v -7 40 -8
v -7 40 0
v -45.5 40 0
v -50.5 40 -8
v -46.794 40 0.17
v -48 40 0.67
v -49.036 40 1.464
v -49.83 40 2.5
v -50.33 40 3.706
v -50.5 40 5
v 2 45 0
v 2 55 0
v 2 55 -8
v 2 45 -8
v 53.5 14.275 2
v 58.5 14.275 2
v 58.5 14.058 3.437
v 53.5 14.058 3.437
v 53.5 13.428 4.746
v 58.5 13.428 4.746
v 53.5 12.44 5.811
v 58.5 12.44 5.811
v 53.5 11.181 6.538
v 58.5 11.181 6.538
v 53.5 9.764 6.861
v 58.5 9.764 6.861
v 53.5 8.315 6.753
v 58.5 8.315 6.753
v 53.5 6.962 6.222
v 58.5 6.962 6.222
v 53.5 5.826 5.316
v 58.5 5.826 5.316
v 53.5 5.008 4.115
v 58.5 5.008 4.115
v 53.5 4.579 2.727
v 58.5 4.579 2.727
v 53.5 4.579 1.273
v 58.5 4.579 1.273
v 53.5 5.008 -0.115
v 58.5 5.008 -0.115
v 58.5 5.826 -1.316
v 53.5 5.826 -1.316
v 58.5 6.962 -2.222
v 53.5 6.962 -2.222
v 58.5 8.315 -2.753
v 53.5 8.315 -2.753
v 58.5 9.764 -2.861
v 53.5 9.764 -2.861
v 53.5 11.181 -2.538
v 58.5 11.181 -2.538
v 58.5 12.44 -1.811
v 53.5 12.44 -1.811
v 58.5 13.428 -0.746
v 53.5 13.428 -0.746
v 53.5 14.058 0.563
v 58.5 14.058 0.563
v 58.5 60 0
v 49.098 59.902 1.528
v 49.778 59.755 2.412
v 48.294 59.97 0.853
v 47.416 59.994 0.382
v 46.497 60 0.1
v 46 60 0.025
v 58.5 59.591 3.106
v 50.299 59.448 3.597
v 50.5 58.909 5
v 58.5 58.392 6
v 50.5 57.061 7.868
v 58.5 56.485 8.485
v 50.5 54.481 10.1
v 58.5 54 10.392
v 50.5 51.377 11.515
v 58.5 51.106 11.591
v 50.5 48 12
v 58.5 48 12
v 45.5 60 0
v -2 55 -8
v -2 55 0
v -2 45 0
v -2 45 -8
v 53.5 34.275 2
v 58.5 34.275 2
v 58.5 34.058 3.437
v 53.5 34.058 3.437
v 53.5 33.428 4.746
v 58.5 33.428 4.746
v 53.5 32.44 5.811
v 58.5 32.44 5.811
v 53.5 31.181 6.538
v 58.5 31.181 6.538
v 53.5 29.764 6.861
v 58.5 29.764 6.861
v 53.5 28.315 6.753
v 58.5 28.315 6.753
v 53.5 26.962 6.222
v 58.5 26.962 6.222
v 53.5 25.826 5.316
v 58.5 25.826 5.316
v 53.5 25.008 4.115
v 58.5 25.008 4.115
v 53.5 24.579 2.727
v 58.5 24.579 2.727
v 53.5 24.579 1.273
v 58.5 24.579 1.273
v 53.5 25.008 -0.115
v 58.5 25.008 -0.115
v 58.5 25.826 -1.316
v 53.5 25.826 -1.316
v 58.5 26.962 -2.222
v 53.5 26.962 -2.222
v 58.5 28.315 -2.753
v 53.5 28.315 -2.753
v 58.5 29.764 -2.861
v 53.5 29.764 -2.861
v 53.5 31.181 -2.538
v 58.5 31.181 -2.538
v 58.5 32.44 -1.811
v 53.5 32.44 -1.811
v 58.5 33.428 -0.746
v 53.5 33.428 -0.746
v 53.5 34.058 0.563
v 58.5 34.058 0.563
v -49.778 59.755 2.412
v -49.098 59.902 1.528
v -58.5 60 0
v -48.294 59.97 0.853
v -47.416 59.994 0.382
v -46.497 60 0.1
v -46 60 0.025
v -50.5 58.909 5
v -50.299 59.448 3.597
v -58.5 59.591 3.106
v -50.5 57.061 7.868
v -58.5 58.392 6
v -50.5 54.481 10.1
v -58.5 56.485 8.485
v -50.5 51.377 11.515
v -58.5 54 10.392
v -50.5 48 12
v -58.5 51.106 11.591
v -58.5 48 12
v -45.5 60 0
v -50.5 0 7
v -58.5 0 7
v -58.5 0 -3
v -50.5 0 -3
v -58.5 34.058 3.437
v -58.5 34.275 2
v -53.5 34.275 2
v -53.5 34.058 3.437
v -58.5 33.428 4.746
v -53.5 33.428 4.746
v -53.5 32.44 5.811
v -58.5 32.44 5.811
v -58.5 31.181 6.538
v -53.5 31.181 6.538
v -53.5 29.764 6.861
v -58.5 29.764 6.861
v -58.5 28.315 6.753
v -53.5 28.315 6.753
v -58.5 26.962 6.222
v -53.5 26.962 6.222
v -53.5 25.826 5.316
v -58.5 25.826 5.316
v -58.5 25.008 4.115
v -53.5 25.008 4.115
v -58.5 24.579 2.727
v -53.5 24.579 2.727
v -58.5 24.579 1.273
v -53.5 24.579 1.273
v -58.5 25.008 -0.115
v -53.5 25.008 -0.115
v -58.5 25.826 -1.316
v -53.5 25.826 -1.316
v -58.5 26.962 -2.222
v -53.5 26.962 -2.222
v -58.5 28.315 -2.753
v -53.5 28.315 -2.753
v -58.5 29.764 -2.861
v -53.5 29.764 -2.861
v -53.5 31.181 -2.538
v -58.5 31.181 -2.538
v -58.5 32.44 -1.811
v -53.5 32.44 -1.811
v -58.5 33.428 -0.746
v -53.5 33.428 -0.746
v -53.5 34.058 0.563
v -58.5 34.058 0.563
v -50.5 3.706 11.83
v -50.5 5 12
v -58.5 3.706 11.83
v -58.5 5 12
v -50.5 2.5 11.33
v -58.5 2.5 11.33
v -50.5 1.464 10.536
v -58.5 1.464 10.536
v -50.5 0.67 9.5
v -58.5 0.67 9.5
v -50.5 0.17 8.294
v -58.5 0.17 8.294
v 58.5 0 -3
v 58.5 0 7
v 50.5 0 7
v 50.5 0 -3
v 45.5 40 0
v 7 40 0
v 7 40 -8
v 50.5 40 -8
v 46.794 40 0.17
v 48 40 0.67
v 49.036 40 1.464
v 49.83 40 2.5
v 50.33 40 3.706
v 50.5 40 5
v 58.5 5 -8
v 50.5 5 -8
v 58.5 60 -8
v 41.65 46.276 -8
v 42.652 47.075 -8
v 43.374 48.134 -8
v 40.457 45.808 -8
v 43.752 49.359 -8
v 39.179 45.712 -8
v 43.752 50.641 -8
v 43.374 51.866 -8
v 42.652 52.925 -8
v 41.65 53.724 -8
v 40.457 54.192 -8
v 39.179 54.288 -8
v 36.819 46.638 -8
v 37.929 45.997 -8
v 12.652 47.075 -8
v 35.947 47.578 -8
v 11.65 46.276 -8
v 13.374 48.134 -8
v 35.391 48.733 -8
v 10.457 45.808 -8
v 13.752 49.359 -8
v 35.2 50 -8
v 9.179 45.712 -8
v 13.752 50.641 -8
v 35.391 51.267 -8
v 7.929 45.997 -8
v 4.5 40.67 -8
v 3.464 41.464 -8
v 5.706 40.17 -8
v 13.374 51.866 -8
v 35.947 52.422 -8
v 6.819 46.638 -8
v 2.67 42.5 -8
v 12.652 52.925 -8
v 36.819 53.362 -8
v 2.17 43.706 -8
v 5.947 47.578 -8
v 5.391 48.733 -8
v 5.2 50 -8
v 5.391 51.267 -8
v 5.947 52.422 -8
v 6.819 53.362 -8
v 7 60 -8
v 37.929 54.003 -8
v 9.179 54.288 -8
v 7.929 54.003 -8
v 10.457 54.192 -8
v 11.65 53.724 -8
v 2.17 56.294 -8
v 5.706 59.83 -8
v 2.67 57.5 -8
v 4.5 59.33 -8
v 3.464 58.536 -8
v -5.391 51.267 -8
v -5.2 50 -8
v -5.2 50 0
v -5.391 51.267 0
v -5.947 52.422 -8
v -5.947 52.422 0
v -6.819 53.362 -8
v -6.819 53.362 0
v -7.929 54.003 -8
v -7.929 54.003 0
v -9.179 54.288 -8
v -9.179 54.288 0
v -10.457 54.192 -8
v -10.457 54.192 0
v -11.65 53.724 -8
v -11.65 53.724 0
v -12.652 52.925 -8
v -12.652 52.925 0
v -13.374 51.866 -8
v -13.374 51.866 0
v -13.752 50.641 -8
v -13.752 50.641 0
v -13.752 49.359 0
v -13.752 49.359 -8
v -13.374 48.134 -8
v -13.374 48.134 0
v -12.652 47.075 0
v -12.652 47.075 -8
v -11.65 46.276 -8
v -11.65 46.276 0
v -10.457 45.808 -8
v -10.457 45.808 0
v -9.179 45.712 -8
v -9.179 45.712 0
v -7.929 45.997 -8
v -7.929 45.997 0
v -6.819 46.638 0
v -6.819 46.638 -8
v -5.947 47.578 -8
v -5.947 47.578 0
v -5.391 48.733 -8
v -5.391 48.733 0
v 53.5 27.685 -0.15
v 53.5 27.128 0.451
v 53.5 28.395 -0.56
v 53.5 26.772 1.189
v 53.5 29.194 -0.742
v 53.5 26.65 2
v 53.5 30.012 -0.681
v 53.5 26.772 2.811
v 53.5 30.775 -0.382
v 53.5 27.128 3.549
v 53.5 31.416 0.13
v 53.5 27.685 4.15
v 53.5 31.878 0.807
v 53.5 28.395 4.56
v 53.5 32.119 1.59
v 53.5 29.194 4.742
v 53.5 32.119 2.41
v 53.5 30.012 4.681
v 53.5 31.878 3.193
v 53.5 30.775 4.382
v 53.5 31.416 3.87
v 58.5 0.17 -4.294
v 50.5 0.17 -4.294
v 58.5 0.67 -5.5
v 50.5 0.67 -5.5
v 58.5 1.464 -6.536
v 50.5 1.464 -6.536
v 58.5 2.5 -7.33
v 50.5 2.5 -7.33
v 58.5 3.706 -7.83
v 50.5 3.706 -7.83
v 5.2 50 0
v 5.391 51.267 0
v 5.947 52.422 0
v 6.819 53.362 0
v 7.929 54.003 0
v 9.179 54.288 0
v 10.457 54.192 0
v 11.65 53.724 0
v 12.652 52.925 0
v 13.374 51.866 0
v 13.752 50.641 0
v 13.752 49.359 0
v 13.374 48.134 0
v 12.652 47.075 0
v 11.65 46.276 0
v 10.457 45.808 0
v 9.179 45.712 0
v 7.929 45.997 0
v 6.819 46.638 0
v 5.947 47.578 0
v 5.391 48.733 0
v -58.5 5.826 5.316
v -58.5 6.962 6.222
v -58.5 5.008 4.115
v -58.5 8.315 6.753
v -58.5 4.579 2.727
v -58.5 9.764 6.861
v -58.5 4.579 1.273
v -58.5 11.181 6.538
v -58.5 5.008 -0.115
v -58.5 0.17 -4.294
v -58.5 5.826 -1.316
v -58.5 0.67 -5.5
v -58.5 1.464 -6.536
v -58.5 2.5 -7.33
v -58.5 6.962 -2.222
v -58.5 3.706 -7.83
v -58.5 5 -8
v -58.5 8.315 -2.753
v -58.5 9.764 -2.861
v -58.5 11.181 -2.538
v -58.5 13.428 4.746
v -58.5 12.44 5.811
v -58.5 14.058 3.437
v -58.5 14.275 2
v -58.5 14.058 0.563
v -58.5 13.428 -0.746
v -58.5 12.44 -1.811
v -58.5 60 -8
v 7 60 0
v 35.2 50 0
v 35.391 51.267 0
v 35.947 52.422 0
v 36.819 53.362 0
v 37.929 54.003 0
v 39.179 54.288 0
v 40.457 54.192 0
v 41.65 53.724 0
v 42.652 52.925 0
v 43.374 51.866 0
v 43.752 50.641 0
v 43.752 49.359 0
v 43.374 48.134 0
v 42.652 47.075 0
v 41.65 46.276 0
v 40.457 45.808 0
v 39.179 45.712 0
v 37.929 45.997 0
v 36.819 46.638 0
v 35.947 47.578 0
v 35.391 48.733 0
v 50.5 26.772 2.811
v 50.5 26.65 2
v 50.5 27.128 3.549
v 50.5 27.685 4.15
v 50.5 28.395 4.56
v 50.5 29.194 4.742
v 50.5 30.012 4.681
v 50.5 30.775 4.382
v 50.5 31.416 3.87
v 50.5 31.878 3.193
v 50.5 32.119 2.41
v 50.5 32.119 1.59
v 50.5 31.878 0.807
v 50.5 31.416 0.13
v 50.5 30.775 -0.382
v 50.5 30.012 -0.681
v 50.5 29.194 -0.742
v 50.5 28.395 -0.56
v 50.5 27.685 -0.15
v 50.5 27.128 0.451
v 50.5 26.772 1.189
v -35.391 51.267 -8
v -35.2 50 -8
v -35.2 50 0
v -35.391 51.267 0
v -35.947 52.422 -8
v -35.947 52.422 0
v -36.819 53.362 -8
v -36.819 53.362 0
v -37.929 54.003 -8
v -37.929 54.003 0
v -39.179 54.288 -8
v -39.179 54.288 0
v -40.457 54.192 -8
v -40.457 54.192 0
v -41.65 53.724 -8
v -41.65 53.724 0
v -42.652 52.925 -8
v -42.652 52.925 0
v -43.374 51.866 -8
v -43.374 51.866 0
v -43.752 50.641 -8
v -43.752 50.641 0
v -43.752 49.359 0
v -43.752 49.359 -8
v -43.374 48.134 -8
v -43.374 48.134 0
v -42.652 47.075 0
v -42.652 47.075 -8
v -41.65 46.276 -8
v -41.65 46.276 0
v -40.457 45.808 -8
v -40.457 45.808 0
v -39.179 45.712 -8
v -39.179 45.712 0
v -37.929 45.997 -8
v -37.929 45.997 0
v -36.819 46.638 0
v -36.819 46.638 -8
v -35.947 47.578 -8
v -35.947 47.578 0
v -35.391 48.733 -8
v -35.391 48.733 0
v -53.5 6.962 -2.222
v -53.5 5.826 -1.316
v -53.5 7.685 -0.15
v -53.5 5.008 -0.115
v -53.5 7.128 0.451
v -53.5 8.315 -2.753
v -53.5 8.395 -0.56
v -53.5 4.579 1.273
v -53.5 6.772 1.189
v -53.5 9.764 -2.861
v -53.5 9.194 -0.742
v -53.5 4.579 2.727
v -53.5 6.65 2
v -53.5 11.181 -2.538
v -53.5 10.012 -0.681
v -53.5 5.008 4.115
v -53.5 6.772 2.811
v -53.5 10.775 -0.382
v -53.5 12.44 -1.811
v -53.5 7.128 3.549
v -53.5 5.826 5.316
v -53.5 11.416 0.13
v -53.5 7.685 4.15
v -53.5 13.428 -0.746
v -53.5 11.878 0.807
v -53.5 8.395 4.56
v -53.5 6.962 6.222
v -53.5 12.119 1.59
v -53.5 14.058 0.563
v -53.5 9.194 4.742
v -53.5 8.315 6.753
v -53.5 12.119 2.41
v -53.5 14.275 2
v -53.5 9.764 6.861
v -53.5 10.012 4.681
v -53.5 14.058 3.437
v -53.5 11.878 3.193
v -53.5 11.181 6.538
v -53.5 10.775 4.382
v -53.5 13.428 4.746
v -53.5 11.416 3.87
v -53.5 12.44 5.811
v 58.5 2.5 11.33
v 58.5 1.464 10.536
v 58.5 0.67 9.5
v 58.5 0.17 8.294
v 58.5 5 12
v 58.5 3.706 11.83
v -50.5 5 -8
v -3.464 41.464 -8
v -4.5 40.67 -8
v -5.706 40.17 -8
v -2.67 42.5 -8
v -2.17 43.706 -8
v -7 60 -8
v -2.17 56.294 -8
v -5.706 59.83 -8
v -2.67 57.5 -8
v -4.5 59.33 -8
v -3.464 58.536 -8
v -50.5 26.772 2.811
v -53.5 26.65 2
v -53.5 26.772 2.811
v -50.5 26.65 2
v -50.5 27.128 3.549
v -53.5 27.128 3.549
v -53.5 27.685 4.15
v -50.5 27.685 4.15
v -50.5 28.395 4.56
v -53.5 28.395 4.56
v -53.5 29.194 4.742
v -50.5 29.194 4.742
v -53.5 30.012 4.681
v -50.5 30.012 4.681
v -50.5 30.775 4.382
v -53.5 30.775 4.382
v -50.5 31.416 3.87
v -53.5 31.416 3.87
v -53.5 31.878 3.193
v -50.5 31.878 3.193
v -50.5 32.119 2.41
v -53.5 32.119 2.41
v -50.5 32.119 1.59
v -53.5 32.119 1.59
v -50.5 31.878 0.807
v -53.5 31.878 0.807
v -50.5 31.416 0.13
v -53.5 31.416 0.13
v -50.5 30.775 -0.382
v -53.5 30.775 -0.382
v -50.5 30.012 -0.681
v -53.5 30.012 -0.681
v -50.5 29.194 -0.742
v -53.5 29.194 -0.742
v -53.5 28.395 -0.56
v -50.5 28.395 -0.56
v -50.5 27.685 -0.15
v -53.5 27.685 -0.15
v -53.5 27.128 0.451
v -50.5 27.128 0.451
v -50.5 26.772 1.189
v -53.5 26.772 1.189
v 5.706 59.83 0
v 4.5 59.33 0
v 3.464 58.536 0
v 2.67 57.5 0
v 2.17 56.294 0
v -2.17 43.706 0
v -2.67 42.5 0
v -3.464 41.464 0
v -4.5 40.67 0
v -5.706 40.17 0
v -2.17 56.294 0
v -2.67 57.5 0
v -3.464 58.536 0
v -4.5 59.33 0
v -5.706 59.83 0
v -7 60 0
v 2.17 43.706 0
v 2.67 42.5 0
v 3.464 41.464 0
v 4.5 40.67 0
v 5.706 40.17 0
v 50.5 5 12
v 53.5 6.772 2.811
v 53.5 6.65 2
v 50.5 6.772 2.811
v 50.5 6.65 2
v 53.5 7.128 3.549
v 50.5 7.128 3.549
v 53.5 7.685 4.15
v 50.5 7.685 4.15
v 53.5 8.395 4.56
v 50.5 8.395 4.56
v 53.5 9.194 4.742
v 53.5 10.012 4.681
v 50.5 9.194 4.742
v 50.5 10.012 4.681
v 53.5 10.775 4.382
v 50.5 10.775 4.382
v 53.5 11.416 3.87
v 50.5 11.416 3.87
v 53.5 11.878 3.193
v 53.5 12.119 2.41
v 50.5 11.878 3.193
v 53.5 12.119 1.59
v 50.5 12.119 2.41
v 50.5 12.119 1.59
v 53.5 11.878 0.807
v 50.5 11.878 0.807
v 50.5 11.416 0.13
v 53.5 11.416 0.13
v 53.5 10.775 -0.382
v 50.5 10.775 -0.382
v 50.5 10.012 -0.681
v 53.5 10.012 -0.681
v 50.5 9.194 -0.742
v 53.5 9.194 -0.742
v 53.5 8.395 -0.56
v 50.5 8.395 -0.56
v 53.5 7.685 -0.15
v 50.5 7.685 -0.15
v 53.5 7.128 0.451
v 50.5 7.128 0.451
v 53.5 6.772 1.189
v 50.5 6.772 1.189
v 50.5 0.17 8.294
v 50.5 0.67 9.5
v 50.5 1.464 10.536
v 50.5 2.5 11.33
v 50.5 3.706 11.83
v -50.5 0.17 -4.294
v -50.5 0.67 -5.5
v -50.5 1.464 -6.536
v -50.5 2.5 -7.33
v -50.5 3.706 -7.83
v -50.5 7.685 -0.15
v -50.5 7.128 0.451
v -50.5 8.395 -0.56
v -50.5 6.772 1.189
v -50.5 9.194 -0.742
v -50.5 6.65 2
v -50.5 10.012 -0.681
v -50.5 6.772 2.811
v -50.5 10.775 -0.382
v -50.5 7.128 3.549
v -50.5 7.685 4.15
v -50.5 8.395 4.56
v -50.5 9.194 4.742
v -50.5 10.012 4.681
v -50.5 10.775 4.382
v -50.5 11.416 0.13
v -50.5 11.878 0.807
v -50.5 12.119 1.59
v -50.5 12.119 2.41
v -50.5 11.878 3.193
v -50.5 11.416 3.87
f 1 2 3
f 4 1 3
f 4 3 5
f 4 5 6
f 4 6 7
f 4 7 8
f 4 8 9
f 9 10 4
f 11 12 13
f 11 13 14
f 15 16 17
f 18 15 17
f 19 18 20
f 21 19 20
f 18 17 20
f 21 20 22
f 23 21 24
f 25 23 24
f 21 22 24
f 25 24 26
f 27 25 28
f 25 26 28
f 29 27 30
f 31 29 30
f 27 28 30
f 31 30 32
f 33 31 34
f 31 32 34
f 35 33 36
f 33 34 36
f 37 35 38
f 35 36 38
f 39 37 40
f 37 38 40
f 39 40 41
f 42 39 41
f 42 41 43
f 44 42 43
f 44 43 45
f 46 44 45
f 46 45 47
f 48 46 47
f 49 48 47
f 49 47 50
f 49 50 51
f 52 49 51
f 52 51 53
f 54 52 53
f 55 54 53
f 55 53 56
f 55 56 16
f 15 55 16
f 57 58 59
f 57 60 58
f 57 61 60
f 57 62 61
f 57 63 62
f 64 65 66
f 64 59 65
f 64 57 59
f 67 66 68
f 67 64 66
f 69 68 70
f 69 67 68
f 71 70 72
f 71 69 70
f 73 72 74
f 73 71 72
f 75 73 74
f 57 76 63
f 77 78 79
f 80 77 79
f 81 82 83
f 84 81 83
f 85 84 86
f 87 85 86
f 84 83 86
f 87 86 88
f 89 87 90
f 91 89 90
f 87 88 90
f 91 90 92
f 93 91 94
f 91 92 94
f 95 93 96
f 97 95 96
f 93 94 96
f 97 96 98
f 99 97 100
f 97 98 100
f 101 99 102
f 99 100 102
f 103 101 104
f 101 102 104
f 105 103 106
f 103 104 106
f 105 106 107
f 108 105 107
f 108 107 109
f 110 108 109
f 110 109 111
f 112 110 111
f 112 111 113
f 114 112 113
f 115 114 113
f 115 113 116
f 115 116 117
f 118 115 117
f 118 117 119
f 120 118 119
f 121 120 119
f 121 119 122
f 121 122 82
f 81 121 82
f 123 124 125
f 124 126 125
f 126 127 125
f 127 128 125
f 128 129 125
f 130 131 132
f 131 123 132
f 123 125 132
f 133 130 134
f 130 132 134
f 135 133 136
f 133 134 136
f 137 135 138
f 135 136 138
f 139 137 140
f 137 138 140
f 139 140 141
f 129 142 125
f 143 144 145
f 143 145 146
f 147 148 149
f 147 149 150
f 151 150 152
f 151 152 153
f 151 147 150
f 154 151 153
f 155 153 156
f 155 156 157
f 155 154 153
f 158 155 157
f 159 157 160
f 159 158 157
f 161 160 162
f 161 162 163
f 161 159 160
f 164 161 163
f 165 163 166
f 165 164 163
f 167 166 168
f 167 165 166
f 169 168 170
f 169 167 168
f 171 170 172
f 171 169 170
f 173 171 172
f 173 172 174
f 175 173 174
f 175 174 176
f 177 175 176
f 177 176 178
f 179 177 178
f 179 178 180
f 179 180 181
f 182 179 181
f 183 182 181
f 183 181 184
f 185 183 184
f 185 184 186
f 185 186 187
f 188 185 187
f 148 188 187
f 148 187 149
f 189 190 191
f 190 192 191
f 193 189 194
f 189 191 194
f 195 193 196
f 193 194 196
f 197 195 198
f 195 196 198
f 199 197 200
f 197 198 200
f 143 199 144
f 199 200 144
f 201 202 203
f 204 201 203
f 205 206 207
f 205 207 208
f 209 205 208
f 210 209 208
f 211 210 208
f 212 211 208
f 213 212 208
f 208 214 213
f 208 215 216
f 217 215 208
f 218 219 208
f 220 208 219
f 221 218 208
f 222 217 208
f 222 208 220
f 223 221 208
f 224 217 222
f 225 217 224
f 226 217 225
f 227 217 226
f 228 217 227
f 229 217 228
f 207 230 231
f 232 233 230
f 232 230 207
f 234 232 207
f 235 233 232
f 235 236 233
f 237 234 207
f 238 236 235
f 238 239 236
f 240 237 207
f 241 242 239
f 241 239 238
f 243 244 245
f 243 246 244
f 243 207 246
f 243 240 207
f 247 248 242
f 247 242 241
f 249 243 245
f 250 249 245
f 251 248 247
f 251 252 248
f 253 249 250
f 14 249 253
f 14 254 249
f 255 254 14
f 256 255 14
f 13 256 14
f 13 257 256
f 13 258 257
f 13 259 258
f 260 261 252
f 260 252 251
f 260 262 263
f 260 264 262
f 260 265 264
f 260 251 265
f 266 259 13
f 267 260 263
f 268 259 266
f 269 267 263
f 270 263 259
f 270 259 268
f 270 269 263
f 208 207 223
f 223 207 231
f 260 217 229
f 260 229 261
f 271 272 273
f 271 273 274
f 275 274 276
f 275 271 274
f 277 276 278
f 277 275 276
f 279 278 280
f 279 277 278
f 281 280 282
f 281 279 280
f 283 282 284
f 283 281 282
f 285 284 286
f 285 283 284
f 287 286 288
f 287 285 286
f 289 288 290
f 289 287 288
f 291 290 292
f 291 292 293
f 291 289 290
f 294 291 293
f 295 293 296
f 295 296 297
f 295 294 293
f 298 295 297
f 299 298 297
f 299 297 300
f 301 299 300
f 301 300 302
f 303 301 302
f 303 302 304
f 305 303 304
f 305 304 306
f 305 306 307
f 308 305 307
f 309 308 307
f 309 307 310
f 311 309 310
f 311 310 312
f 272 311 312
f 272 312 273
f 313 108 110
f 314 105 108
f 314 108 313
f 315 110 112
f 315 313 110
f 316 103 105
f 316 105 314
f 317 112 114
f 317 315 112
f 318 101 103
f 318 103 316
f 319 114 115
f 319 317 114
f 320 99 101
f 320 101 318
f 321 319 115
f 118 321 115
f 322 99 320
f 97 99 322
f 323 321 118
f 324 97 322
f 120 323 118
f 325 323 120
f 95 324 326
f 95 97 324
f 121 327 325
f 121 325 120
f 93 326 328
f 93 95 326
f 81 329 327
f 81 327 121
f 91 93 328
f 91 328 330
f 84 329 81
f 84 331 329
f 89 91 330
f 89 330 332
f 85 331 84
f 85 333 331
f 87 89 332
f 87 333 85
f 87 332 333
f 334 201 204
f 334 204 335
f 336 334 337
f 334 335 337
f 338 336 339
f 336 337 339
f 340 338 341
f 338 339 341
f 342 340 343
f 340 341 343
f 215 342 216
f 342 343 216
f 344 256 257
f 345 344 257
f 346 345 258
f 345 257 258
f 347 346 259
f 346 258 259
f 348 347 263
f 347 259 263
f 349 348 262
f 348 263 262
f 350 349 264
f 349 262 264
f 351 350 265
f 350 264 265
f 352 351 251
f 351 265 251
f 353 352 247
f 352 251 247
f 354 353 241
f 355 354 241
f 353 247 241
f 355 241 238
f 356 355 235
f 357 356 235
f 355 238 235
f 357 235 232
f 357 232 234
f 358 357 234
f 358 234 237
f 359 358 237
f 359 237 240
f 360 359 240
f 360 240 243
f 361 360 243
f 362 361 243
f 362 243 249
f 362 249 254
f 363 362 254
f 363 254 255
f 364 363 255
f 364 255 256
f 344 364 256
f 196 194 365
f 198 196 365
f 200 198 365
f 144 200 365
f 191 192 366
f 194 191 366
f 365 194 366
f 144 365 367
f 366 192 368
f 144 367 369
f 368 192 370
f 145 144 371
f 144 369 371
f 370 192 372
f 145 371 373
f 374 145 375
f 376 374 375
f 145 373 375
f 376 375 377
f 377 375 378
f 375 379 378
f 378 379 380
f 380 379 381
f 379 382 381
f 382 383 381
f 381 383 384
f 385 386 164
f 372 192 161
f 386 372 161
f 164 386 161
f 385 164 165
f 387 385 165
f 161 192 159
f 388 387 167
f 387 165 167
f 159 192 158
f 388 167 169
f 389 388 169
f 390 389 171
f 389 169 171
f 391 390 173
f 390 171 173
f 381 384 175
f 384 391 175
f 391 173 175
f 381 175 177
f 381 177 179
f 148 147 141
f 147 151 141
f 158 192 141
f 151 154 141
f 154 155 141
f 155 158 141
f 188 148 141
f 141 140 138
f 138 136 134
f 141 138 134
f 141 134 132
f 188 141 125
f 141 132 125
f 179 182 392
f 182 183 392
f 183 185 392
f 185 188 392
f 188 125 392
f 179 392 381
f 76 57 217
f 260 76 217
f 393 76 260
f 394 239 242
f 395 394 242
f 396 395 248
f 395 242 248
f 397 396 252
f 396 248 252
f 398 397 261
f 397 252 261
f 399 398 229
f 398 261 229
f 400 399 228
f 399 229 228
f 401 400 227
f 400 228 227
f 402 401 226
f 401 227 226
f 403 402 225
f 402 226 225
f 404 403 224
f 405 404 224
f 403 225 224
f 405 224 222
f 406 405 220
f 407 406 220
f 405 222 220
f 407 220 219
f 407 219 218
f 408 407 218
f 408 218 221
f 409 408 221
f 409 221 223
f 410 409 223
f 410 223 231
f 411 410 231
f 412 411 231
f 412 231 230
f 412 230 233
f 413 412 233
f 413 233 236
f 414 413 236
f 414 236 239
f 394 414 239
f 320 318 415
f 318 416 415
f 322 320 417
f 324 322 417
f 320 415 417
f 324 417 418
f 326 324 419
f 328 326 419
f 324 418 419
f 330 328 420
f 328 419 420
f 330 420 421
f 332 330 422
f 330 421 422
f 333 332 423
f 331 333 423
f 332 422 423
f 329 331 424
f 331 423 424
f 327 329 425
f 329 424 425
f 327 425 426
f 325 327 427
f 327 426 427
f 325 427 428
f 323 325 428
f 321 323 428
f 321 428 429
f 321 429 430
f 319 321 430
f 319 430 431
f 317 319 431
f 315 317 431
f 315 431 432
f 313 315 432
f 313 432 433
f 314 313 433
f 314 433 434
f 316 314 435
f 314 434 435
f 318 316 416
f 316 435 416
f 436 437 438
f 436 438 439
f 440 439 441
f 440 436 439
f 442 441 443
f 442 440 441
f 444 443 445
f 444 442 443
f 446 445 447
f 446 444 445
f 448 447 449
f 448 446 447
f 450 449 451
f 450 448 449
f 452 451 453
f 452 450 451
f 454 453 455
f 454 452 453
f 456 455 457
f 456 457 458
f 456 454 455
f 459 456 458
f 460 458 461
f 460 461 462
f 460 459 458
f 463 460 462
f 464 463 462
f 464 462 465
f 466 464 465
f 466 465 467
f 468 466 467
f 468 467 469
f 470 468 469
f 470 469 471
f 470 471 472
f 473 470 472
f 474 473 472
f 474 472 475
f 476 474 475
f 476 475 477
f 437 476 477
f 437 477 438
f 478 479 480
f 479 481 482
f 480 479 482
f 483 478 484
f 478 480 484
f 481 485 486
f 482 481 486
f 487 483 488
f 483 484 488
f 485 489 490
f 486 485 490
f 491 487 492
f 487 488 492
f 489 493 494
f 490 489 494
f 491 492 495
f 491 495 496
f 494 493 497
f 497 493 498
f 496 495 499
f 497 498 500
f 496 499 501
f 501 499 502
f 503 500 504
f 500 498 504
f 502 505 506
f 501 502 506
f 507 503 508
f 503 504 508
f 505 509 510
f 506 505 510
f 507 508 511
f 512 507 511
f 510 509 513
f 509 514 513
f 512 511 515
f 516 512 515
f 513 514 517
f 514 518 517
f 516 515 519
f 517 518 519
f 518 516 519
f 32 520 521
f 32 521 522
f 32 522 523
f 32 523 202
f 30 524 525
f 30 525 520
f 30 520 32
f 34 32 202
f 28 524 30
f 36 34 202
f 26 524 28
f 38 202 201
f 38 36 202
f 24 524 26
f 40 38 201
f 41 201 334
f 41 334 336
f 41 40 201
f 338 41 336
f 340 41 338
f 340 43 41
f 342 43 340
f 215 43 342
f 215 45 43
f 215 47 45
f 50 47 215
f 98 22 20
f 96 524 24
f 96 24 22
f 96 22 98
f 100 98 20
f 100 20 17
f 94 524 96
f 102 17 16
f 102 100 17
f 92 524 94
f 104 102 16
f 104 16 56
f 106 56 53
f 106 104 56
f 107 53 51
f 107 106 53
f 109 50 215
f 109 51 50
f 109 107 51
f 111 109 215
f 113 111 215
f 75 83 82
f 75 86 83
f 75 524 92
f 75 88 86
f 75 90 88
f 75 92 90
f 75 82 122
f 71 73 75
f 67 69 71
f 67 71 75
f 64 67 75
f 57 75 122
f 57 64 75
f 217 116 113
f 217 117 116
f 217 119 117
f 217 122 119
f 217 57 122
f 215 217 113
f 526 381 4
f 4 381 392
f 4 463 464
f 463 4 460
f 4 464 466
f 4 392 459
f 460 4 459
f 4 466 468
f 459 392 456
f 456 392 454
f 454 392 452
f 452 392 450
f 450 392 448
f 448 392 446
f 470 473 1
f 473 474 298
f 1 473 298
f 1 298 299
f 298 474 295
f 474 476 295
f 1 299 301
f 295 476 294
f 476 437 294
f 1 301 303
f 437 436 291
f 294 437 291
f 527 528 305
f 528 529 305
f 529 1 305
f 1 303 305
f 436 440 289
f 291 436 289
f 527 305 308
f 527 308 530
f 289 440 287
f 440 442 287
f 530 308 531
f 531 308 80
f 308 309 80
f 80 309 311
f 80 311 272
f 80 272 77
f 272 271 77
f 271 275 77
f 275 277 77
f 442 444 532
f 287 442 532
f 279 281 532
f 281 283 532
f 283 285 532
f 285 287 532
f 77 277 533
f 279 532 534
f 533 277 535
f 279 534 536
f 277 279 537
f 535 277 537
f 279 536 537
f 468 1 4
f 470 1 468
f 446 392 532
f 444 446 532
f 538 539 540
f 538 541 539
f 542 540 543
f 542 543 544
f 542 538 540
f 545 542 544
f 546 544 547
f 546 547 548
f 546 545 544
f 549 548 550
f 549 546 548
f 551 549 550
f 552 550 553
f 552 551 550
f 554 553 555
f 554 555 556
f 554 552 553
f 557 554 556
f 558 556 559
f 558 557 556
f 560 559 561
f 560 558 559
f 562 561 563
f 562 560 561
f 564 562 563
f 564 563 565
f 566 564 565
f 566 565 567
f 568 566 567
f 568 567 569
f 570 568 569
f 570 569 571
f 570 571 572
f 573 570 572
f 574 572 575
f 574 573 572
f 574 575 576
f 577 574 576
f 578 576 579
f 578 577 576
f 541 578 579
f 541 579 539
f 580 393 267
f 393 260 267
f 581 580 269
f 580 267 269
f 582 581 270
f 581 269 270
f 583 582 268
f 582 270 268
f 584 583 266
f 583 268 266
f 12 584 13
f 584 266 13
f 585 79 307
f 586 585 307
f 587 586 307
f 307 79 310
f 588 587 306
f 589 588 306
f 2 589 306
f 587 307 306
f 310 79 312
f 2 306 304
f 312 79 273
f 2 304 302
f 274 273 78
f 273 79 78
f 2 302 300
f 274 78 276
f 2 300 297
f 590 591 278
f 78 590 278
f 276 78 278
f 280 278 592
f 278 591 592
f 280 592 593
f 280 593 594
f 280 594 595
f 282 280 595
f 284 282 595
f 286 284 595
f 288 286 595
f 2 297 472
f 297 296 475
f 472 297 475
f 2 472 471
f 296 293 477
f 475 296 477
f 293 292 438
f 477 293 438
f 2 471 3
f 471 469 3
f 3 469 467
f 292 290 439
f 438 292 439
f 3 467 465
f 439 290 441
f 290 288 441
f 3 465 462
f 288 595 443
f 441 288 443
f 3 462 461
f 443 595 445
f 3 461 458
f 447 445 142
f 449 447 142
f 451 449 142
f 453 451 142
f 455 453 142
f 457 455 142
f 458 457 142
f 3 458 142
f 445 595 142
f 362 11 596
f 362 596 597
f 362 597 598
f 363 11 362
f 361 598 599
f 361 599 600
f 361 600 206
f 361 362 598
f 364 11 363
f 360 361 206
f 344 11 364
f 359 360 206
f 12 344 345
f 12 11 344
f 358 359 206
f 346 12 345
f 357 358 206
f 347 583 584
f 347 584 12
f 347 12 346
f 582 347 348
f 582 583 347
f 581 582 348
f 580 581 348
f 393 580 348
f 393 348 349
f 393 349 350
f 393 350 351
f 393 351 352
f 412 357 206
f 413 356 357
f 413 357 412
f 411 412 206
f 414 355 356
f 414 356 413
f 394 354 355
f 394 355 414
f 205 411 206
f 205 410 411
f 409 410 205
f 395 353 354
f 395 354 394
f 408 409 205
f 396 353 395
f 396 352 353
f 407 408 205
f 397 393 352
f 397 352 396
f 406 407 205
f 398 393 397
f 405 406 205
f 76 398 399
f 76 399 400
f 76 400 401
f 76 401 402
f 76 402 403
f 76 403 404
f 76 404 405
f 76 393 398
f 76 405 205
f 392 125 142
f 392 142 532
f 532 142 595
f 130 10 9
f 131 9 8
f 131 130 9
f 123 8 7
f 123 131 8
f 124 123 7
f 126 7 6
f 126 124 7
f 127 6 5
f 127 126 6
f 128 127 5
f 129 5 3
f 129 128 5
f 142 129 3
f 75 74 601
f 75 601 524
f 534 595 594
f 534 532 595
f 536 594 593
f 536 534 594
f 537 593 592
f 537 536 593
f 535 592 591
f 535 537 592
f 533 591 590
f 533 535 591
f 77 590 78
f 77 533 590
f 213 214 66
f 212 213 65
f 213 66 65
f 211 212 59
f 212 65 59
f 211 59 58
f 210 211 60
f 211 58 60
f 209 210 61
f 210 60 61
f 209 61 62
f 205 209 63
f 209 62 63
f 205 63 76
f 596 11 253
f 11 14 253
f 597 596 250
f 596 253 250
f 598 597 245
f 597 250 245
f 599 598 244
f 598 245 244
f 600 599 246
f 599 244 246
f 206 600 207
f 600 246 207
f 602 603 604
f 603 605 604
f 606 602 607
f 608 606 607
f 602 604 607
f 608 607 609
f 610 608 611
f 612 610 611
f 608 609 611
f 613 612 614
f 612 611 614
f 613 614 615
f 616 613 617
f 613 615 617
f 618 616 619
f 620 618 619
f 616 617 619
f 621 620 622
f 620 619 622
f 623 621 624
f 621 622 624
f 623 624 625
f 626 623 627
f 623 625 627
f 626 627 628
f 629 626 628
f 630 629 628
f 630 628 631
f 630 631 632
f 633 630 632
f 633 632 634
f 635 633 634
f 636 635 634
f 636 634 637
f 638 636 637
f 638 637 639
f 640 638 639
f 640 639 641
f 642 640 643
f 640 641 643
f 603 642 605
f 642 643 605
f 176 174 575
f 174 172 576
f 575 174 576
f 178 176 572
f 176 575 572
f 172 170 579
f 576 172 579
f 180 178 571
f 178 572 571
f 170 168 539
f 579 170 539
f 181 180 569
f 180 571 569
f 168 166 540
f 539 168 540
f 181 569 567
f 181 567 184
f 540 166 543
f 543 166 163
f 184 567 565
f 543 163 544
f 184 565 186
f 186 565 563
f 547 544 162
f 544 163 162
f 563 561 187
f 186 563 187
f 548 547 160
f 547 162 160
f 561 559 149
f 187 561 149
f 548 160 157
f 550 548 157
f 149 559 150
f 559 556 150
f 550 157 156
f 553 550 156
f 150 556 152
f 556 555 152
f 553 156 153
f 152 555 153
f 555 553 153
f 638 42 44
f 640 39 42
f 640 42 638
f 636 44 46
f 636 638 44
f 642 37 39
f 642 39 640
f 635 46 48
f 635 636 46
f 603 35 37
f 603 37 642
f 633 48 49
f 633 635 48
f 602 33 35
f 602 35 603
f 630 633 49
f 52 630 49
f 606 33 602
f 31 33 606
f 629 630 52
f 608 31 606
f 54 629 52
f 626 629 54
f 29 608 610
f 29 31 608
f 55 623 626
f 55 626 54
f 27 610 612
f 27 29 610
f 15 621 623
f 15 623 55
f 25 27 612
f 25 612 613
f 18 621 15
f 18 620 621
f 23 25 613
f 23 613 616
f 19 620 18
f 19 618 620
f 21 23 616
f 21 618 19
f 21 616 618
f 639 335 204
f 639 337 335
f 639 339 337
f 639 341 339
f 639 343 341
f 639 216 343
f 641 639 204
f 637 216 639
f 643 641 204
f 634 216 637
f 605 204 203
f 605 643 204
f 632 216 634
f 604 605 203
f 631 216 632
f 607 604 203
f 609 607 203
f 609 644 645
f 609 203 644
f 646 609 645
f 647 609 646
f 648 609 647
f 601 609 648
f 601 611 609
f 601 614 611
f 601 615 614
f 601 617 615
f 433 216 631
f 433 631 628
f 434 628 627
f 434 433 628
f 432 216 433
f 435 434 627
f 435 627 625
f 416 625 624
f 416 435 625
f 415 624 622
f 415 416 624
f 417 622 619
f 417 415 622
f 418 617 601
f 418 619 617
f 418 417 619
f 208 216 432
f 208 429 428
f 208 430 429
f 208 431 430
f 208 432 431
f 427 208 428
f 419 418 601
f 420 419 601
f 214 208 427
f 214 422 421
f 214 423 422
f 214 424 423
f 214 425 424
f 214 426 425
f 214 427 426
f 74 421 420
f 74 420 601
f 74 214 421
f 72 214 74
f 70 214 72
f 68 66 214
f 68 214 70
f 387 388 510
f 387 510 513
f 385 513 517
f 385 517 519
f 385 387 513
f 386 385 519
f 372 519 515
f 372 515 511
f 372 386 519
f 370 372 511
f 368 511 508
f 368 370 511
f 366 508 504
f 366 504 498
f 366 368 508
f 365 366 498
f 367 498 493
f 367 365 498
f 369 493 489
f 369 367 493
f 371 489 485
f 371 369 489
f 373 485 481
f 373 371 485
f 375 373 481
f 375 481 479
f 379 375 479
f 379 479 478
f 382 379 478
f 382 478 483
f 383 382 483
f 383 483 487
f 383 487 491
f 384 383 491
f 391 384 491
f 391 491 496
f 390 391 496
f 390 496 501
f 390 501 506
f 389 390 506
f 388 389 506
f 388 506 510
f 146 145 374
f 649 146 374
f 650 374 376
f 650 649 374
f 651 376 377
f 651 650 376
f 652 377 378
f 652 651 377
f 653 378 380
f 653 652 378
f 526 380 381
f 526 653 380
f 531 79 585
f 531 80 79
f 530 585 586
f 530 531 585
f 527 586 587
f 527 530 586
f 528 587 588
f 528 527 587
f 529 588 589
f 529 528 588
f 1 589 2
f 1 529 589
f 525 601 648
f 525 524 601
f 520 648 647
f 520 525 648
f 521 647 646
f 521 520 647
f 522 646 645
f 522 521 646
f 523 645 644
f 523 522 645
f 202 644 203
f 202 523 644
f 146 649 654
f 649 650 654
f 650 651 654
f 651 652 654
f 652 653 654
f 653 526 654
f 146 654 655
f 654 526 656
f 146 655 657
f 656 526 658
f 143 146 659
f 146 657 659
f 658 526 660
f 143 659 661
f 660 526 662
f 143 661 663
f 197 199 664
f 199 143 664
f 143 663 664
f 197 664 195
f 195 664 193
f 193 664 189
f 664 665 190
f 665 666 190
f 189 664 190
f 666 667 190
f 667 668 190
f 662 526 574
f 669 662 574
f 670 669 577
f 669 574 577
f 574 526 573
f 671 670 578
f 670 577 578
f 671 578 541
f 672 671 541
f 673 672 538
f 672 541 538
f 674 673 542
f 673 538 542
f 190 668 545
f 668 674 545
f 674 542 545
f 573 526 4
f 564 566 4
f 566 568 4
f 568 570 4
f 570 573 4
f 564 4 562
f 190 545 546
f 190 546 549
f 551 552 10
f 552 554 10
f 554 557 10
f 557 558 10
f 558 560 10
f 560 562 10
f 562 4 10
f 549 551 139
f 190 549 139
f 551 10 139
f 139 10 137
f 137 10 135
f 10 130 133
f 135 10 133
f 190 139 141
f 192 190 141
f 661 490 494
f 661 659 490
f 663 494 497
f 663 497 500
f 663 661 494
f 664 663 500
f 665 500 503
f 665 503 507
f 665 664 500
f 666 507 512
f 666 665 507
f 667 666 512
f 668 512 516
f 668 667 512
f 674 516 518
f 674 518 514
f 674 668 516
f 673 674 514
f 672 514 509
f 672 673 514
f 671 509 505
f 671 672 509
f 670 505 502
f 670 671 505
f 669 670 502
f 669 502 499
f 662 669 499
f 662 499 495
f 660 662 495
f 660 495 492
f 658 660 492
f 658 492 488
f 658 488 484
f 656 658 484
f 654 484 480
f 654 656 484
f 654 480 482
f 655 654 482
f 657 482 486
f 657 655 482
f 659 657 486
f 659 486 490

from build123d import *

# Parameters (mm, degrees)
F1_DEPTH       = 8
F2_D           = 8.6
F4_DEPTH       = 60
F6_D           = 5.5
F6_DEPTH       = 30
F6_CBORE_D     = 9.75
F6_CBORE_DEPTH = 5
F6_TIP         = 1.6523667023
F7_R           = 12
F8_R           = 5


with BuildPart() as f1:
    # F0 (on Top) → F1 (new body)
    with BuildSketch(Plane.XY):
        Polygon((50.5, 40), (50.5, 60), (2, 60), (2, 40), (17, 40), align=None)
    extrude(amount=-F1_DEPTH)

    # F2 (through all)
    with Locations(Plane.XY):
        with Locations((9.5, 50), (39.5, 50)):
            Hole(F2_D / 2)

    # F3 (on face) → F4 (join)
    with BuildSketch(Plane(origin=(0, 60, 0), x_dir=(-1, 0, 0), z_dir=(0, 1, 0))):
        Polygon((-58.5, -8), (-50.5, -8), (-50.5, 0), (-50.5, 12), (-58.5, 12), align=None)
    extrude(amount=-F4_DEPTH)

    # F6
    with Locations(Plane.YZ.offset(58.5)):
        with Locations((9.4, 2), (29.4, 2)):
            CounterBoreHole(F6_D / 2, F6_CBORE_D / 2, F6_CBORE_DEPTH, depth=F6_DEPTH)
            with Locations((0, 0, -(F6_DEPTH + F6_TIP / 2))):  # 118° drill point
                Cone(0, F6_D / 2, F6_TIP, mode=Mode.SUBTRACT)

    # F7
    f7_edges = [f1.edges().sort_by_distance(p)[0] for p in [
        (54.5, 60, 12),
    ]]
    fillet(f7_edges, radius=F7_R)

    # F8
    f8_edges = [f1.edges().sort_by_distance(p)[0] for p in [
        (54.5, 0, 12),
        (54.5, 0, -8),
        (2, 40, -4),
        (2, 60, -4),
        (50.5, 50, 0),
    ]]
    fillet(f8_edges, radius=F8_R)


with BuildPart() as f9_1:
    # F9: instance of F1
    add(f1.part.mirror(Plane.YZ))


solid = Compound([f1.part, f9_1.part])
